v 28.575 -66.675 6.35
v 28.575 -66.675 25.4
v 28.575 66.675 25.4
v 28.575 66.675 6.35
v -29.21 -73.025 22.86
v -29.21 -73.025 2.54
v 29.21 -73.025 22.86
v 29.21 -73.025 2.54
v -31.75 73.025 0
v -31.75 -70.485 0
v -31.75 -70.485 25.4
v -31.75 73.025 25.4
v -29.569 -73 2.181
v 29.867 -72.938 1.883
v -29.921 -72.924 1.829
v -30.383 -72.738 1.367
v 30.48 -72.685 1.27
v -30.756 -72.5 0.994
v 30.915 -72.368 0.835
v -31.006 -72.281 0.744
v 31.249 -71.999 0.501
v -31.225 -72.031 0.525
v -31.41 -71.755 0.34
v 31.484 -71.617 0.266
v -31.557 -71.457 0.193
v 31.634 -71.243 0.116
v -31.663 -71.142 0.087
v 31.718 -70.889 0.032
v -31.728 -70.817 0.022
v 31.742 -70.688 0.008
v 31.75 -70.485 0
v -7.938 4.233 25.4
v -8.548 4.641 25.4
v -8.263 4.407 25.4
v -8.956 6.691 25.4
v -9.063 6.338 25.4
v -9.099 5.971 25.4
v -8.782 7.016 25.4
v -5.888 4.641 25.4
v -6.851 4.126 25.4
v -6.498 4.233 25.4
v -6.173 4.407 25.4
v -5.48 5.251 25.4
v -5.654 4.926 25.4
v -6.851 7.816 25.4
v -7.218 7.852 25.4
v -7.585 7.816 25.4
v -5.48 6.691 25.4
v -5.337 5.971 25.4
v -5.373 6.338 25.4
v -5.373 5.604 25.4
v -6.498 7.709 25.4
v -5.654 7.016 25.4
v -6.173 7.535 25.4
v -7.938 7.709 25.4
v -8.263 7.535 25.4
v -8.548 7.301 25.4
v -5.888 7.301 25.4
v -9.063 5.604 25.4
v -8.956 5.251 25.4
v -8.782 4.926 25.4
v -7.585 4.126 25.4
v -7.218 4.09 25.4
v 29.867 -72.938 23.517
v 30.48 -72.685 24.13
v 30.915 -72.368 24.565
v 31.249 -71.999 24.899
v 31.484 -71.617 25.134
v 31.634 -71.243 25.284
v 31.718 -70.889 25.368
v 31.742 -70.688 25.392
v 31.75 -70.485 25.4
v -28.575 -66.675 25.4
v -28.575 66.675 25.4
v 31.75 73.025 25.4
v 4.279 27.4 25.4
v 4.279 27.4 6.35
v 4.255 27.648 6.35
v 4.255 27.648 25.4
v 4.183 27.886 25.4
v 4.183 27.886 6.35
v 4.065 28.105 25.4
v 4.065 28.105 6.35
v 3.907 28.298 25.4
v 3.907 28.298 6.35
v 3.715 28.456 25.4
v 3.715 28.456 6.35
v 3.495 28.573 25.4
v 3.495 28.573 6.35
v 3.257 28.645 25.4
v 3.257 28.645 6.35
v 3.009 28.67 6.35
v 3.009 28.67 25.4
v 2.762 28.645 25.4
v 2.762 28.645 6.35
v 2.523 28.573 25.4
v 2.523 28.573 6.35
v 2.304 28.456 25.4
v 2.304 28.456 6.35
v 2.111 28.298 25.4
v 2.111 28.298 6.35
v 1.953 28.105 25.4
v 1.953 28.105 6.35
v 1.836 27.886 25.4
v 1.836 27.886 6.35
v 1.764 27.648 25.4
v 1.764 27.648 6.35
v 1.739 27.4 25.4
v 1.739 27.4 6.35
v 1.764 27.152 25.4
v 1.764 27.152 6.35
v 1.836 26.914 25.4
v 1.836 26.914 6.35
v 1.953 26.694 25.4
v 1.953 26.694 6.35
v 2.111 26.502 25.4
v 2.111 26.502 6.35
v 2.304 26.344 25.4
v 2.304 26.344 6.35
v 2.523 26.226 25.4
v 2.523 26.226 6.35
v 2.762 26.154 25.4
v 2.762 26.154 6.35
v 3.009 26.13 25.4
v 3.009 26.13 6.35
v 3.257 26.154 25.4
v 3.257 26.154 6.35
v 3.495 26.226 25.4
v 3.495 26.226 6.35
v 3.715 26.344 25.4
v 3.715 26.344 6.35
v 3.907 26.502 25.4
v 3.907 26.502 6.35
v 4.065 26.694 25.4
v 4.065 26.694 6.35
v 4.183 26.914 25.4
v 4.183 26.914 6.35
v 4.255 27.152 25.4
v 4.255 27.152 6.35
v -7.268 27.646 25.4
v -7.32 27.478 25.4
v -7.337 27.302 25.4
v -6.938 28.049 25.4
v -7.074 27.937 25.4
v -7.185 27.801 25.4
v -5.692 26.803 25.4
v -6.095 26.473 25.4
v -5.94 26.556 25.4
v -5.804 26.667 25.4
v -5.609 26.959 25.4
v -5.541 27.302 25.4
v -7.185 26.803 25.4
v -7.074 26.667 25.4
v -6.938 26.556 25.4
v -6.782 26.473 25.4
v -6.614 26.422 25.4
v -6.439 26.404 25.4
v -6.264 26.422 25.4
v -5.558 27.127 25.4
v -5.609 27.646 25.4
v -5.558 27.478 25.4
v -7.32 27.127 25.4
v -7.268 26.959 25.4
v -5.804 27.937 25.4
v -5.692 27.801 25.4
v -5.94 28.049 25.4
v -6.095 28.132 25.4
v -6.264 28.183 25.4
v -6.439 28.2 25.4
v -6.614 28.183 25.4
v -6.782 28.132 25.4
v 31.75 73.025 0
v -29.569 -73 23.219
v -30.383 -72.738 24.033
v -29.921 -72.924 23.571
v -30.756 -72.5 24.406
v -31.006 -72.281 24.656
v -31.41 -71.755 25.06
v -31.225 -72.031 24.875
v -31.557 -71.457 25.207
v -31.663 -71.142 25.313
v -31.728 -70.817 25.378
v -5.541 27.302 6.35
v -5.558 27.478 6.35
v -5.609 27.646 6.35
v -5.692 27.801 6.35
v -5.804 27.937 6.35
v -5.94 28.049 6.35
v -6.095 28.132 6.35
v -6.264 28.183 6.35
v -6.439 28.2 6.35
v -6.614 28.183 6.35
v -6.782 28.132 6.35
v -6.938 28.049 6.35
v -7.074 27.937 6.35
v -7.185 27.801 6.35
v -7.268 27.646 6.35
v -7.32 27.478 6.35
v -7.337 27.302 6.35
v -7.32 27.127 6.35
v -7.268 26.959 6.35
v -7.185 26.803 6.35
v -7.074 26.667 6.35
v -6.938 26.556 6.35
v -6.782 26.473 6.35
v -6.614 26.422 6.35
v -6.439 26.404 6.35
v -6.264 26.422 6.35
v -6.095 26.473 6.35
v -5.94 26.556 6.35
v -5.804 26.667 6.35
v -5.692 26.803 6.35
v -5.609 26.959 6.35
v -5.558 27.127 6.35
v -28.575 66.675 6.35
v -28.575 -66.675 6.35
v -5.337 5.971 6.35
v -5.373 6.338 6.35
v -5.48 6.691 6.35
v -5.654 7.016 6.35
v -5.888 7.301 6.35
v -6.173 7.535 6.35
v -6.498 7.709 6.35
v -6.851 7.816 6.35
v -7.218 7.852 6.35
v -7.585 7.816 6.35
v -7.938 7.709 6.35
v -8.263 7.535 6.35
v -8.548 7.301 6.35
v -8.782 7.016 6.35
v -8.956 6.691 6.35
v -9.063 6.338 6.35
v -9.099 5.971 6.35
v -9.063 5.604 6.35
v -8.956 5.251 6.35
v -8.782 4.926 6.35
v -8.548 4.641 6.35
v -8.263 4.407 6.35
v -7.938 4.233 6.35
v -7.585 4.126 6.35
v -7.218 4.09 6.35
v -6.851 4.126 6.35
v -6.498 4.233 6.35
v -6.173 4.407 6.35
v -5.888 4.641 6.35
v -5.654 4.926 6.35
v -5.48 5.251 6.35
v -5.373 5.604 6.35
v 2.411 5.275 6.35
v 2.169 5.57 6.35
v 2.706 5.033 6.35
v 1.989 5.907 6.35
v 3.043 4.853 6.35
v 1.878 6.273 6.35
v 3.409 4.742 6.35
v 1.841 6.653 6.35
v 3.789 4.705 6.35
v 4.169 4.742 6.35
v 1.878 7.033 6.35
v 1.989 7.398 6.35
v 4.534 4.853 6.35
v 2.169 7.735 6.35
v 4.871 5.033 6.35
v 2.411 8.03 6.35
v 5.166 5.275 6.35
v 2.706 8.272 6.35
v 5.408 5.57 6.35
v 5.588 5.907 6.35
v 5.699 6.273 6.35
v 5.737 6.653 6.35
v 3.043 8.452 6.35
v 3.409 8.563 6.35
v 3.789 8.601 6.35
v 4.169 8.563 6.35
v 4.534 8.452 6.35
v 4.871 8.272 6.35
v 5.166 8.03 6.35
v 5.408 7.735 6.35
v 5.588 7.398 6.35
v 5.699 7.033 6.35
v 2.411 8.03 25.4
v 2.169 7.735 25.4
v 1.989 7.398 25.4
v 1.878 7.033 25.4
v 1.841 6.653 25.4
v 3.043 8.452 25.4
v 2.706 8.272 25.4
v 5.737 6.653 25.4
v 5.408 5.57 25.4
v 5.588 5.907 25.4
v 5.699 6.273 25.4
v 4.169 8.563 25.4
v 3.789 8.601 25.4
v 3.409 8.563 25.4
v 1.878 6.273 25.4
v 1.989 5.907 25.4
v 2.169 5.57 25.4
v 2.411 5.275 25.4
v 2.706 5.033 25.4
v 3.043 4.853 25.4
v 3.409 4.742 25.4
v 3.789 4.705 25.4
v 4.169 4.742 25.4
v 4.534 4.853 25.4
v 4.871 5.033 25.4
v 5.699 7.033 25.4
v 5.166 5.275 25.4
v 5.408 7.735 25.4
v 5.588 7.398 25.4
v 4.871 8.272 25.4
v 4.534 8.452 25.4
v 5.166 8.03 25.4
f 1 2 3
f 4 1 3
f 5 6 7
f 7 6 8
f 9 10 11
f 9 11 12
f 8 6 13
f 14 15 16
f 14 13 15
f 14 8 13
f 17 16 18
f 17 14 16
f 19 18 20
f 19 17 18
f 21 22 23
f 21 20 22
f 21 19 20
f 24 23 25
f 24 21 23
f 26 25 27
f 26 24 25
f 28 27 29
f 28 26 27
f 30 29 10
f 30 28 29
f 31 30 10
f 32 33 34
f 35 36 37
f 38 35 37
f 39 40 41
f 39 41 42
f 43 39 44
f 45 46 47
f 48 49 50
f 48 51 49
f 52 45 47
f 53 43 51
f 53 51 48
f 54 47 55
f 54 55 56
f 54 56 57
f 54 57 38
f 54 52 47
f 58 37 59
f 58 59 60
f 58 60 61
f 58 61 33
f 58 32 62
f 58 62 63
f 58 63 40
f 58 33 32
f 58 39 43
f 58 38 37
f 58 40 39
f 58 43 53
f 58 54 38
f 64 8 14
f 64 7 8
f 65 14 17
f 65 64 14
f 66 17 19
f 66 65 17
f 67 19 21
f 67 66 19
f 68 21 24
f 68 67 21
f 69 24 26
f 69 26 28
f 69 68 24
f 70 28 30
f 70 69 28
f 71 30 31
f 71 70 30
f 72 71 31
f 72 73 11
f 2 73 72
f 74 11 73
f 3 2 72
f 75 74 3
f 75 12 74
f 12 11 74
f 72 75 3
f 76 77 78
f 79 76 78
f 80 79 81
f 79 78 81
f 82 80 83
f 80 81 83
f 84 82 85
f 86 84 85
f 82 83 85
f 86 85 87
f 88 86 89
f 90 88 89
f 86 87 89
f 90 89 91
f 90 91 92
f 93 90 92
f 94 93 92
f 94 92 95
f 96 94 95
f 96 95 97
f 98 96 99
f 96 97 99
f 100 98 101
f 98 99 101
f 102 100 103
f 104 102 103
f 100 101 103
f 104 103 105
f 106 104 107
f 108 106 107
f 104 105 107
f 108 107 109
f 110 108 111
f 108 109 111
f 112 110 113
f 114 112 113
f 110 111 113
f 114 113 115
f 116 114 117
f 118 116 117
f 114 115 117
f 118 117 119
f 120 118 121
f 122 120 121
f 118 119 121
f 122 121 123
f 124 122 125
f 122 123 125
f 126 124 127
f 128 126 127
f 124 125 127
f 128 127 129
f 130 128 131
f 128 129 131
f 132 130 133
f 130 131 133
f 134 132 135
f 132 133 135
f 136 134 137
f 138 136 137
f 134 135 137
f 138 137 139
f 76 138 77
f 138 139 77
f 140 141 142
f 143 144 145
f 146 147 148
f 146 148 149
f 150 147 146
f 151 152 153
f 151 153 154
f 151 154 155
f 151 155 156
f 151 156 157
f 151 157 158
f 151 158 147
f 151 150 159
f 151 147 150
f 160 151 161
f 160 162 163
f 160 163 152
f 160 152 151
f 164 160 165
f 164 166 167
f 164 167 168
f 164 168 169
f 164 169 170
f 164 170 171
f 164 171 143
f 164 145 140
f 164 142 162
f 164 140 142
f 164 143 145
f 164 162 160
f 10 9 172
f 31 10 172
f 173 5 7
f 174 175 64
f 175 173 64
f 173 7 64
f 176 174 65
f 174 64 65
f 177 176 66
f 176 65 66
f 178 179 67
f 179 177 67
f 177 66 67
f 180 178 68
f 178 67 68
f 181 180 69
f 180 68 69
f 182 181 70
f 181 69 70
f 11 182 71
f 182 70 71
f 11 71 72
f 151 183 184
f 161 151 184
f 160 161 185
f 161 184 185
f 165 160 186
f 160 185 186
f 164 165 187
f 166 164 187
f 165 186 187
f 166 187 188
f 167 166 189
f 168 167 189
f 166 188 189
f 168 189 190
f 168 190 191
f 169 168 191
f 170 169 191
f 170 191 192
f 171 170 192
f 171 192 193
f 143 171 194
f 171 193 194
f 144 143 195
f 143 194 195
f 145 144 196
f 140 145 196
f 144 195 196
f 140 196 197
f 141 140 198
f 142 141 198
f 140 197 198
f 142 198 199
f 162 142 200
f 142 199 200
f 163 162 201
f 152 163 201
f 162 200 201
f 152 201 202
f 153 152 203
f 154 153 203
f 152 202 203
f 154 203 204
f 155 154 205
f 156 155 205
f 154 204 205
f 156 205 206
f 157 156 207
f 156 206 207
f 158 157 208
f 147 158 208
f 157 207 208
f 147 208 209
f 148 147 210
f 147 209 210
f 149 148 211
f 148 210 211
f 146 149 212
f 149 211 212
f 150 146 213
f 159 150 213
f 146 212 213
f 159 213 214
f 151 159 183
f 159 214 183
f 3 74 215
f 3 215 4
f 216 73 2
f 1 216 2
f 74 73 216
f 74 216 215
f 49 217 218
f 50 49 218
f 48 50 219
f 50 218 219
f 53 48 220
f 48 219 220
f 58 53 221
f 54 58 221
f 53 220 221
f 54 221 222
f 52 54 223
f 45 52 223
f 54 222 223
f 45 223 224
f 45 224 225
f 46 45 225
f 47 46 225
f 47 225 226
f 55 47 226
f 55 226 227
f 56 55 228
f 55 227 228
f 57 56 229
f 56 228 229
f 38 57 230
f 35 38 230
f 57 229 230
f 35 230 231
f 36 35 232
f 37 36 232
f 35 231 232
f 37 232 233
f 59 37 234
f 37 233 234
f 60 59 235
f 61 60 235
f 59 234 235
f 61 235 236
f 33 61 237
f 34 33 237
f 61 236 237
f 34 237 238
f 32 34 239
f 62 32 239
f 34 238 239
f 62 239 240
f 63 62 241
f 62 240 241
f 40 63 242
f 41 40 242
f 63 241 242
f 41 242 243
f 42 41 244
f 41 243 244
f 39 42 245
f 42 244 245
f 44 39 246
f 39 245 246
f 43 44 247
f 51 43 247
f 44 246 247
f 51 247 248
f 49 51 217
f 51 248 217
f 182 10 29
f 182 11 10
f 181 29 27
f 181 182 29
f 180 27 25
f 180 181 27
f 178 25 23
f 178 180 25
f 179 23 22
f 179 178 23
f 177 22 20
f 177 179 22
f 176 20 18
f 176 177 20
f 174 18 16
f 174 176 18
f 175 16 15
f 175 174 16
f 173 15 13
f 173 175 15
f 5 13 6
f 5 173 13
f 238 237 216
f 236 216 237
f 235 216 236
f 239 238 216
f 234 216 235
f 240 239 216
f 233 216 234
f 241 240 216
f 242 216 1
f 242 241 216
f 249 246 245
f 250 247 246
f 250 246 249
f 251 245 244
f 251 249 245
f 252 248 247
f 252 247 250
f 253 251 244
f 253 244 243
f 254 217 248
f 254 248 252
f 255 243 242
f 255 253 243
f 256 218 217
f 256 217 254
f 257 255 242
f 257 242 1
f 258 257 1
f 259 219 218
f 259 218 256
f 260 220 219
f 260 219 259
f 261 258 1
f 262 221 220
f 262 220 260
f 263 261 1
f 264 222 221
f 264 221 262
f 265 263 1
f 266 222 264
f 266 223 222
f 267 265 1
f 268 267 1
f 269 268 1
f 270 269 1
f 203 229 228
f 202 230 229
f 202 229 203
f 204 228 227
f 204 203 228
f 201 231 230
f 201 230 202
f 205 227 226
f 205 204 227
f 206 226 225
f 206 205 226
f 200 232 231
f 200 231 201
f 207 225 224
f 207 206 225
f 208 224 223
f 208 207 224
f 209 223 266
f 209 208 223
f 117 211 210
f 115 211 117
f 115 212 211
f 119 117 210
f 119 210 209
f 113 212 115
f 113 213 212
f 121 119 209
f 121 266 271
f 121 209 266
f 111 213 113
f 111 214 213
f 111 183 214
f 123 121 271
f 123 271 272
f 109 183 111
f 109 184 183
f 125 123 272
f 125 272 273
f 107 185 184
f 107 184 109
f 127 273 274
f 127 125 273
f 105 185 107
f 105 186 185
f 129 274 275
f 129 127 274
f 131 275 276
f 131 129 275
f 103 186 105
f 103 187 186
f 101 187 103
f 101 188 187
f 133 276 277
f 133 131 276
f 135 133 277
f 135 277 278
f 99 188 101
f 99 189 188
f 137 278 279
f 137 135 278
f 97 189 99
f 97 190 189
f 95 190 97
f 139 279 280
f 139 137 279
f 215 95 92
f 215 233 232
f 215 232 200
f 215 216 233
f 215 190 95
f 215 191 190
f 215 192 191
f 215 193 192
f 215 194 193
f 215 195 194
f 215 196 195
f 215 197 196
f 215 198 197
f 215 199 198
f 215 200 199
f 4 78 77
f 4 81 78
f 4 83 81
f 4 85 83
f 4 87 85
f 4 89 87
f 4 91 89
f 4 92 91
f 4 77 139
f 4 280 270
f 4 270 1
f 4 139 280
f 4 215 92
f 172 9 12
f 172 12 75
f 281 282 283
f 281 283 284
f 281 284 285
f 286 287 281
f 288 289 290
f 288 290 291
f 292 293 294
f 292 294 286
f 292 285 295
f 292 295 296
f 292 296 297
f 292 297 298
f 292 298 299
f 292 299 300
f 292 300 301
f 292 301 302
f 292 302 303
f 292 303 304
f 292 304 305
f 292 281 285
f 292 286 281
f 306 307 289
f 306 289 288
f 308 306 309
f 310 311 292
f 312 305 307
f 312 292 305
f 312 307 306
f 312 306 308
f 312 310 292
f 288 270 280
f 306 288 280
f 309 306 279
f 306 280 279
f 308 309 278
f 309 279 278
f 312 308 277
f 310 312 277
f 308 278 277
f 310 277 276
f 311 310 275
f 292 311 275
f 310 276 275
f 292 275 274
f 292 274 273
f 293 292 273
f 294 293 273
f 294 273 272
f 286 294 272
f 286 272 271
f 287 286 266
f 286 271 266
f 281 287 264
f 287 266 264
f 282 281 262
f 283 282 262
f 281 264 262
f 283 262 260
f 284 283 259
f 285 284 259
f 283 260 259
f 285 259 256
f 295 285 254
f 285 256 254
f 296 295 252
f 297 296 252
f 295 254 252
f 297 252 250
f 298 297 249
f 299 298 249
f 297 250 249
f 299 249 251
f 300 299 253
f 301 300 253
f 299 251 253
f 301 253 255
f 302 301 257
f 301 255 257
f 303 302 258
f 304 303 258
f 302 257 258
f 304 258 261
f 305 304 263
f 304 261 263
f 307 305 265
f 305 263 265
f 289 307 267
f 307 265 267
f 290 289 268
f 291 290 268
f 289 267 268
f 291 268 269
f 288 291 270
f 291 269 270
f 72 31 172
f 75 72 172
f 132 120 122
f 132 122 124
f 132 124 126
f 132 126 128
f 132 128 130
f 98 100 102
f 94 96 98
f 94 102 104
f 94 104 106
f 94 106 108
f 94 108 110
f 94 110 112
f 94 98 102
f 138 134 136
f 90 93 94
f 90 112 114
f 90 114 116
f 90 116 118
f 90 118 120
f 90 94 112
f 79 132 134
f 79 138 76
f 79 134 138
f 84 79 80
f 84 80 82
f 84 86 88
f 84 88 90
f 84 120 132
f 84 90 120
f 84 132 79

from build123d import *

# Parameters (mm, degrees)
F0_W     = 63.5
F0_H     = 146.05
F1_DEPTH = 25.4
F2_W     = 57.15
F2_H     = 133.35
F3_DEPTH = 19.05
F4_R     = 0.898026
F4_R_2   = 1.27
F4_R_3   = 1.881193
F4_R_4   = 1.948089
F5_DEPTH = 19.05
F6_R     = 2.54


with BuildPart() as f1:
    # F0 (on Top) → F1 (new body)
    with BuildSketch(Plane.XY):
        Rectangle(F0_W, F0_H)
    extrude(amount=F1_DEPTH)

    # F2 (on face) → F3 (cut)
    with BuildSketch(Plane.XY.offset(25.4)):
        Rectangle(F2_W, F2_H)
    extrude(amount=-F3_DEPTH, mode=Mode.SUBTRACT)

    # F4 (on face) → F5 (join)
    with BuildSketch(Plane.XY.offset(6.35)):
        with Locations((-6.438811, 27.302402)):
            Circle(F4_R)
        with Locations((3.009427, 27.399807)):
            Circle(F4_R_2)
        with Locations((-7.218048, 5.970811)):
            Circle(F4_R_3)
        with Locations((3.788662, 6.652642)):
            Circle(F4_R_4)
    extrude(amount=F5_DEPTH)

    # F6
    f6_edges = [f1.edges().sort_by_distance(p)[0] for p in [
        (-31.75, -73.025, 12.7),
        (31.75, -73.025, 12.7),
        (0, -73.025, 0),
        (0, -73.025, 25.4),
    ]]
    fillet(f6_edges, radius=F6_R)


solid = f1.part
